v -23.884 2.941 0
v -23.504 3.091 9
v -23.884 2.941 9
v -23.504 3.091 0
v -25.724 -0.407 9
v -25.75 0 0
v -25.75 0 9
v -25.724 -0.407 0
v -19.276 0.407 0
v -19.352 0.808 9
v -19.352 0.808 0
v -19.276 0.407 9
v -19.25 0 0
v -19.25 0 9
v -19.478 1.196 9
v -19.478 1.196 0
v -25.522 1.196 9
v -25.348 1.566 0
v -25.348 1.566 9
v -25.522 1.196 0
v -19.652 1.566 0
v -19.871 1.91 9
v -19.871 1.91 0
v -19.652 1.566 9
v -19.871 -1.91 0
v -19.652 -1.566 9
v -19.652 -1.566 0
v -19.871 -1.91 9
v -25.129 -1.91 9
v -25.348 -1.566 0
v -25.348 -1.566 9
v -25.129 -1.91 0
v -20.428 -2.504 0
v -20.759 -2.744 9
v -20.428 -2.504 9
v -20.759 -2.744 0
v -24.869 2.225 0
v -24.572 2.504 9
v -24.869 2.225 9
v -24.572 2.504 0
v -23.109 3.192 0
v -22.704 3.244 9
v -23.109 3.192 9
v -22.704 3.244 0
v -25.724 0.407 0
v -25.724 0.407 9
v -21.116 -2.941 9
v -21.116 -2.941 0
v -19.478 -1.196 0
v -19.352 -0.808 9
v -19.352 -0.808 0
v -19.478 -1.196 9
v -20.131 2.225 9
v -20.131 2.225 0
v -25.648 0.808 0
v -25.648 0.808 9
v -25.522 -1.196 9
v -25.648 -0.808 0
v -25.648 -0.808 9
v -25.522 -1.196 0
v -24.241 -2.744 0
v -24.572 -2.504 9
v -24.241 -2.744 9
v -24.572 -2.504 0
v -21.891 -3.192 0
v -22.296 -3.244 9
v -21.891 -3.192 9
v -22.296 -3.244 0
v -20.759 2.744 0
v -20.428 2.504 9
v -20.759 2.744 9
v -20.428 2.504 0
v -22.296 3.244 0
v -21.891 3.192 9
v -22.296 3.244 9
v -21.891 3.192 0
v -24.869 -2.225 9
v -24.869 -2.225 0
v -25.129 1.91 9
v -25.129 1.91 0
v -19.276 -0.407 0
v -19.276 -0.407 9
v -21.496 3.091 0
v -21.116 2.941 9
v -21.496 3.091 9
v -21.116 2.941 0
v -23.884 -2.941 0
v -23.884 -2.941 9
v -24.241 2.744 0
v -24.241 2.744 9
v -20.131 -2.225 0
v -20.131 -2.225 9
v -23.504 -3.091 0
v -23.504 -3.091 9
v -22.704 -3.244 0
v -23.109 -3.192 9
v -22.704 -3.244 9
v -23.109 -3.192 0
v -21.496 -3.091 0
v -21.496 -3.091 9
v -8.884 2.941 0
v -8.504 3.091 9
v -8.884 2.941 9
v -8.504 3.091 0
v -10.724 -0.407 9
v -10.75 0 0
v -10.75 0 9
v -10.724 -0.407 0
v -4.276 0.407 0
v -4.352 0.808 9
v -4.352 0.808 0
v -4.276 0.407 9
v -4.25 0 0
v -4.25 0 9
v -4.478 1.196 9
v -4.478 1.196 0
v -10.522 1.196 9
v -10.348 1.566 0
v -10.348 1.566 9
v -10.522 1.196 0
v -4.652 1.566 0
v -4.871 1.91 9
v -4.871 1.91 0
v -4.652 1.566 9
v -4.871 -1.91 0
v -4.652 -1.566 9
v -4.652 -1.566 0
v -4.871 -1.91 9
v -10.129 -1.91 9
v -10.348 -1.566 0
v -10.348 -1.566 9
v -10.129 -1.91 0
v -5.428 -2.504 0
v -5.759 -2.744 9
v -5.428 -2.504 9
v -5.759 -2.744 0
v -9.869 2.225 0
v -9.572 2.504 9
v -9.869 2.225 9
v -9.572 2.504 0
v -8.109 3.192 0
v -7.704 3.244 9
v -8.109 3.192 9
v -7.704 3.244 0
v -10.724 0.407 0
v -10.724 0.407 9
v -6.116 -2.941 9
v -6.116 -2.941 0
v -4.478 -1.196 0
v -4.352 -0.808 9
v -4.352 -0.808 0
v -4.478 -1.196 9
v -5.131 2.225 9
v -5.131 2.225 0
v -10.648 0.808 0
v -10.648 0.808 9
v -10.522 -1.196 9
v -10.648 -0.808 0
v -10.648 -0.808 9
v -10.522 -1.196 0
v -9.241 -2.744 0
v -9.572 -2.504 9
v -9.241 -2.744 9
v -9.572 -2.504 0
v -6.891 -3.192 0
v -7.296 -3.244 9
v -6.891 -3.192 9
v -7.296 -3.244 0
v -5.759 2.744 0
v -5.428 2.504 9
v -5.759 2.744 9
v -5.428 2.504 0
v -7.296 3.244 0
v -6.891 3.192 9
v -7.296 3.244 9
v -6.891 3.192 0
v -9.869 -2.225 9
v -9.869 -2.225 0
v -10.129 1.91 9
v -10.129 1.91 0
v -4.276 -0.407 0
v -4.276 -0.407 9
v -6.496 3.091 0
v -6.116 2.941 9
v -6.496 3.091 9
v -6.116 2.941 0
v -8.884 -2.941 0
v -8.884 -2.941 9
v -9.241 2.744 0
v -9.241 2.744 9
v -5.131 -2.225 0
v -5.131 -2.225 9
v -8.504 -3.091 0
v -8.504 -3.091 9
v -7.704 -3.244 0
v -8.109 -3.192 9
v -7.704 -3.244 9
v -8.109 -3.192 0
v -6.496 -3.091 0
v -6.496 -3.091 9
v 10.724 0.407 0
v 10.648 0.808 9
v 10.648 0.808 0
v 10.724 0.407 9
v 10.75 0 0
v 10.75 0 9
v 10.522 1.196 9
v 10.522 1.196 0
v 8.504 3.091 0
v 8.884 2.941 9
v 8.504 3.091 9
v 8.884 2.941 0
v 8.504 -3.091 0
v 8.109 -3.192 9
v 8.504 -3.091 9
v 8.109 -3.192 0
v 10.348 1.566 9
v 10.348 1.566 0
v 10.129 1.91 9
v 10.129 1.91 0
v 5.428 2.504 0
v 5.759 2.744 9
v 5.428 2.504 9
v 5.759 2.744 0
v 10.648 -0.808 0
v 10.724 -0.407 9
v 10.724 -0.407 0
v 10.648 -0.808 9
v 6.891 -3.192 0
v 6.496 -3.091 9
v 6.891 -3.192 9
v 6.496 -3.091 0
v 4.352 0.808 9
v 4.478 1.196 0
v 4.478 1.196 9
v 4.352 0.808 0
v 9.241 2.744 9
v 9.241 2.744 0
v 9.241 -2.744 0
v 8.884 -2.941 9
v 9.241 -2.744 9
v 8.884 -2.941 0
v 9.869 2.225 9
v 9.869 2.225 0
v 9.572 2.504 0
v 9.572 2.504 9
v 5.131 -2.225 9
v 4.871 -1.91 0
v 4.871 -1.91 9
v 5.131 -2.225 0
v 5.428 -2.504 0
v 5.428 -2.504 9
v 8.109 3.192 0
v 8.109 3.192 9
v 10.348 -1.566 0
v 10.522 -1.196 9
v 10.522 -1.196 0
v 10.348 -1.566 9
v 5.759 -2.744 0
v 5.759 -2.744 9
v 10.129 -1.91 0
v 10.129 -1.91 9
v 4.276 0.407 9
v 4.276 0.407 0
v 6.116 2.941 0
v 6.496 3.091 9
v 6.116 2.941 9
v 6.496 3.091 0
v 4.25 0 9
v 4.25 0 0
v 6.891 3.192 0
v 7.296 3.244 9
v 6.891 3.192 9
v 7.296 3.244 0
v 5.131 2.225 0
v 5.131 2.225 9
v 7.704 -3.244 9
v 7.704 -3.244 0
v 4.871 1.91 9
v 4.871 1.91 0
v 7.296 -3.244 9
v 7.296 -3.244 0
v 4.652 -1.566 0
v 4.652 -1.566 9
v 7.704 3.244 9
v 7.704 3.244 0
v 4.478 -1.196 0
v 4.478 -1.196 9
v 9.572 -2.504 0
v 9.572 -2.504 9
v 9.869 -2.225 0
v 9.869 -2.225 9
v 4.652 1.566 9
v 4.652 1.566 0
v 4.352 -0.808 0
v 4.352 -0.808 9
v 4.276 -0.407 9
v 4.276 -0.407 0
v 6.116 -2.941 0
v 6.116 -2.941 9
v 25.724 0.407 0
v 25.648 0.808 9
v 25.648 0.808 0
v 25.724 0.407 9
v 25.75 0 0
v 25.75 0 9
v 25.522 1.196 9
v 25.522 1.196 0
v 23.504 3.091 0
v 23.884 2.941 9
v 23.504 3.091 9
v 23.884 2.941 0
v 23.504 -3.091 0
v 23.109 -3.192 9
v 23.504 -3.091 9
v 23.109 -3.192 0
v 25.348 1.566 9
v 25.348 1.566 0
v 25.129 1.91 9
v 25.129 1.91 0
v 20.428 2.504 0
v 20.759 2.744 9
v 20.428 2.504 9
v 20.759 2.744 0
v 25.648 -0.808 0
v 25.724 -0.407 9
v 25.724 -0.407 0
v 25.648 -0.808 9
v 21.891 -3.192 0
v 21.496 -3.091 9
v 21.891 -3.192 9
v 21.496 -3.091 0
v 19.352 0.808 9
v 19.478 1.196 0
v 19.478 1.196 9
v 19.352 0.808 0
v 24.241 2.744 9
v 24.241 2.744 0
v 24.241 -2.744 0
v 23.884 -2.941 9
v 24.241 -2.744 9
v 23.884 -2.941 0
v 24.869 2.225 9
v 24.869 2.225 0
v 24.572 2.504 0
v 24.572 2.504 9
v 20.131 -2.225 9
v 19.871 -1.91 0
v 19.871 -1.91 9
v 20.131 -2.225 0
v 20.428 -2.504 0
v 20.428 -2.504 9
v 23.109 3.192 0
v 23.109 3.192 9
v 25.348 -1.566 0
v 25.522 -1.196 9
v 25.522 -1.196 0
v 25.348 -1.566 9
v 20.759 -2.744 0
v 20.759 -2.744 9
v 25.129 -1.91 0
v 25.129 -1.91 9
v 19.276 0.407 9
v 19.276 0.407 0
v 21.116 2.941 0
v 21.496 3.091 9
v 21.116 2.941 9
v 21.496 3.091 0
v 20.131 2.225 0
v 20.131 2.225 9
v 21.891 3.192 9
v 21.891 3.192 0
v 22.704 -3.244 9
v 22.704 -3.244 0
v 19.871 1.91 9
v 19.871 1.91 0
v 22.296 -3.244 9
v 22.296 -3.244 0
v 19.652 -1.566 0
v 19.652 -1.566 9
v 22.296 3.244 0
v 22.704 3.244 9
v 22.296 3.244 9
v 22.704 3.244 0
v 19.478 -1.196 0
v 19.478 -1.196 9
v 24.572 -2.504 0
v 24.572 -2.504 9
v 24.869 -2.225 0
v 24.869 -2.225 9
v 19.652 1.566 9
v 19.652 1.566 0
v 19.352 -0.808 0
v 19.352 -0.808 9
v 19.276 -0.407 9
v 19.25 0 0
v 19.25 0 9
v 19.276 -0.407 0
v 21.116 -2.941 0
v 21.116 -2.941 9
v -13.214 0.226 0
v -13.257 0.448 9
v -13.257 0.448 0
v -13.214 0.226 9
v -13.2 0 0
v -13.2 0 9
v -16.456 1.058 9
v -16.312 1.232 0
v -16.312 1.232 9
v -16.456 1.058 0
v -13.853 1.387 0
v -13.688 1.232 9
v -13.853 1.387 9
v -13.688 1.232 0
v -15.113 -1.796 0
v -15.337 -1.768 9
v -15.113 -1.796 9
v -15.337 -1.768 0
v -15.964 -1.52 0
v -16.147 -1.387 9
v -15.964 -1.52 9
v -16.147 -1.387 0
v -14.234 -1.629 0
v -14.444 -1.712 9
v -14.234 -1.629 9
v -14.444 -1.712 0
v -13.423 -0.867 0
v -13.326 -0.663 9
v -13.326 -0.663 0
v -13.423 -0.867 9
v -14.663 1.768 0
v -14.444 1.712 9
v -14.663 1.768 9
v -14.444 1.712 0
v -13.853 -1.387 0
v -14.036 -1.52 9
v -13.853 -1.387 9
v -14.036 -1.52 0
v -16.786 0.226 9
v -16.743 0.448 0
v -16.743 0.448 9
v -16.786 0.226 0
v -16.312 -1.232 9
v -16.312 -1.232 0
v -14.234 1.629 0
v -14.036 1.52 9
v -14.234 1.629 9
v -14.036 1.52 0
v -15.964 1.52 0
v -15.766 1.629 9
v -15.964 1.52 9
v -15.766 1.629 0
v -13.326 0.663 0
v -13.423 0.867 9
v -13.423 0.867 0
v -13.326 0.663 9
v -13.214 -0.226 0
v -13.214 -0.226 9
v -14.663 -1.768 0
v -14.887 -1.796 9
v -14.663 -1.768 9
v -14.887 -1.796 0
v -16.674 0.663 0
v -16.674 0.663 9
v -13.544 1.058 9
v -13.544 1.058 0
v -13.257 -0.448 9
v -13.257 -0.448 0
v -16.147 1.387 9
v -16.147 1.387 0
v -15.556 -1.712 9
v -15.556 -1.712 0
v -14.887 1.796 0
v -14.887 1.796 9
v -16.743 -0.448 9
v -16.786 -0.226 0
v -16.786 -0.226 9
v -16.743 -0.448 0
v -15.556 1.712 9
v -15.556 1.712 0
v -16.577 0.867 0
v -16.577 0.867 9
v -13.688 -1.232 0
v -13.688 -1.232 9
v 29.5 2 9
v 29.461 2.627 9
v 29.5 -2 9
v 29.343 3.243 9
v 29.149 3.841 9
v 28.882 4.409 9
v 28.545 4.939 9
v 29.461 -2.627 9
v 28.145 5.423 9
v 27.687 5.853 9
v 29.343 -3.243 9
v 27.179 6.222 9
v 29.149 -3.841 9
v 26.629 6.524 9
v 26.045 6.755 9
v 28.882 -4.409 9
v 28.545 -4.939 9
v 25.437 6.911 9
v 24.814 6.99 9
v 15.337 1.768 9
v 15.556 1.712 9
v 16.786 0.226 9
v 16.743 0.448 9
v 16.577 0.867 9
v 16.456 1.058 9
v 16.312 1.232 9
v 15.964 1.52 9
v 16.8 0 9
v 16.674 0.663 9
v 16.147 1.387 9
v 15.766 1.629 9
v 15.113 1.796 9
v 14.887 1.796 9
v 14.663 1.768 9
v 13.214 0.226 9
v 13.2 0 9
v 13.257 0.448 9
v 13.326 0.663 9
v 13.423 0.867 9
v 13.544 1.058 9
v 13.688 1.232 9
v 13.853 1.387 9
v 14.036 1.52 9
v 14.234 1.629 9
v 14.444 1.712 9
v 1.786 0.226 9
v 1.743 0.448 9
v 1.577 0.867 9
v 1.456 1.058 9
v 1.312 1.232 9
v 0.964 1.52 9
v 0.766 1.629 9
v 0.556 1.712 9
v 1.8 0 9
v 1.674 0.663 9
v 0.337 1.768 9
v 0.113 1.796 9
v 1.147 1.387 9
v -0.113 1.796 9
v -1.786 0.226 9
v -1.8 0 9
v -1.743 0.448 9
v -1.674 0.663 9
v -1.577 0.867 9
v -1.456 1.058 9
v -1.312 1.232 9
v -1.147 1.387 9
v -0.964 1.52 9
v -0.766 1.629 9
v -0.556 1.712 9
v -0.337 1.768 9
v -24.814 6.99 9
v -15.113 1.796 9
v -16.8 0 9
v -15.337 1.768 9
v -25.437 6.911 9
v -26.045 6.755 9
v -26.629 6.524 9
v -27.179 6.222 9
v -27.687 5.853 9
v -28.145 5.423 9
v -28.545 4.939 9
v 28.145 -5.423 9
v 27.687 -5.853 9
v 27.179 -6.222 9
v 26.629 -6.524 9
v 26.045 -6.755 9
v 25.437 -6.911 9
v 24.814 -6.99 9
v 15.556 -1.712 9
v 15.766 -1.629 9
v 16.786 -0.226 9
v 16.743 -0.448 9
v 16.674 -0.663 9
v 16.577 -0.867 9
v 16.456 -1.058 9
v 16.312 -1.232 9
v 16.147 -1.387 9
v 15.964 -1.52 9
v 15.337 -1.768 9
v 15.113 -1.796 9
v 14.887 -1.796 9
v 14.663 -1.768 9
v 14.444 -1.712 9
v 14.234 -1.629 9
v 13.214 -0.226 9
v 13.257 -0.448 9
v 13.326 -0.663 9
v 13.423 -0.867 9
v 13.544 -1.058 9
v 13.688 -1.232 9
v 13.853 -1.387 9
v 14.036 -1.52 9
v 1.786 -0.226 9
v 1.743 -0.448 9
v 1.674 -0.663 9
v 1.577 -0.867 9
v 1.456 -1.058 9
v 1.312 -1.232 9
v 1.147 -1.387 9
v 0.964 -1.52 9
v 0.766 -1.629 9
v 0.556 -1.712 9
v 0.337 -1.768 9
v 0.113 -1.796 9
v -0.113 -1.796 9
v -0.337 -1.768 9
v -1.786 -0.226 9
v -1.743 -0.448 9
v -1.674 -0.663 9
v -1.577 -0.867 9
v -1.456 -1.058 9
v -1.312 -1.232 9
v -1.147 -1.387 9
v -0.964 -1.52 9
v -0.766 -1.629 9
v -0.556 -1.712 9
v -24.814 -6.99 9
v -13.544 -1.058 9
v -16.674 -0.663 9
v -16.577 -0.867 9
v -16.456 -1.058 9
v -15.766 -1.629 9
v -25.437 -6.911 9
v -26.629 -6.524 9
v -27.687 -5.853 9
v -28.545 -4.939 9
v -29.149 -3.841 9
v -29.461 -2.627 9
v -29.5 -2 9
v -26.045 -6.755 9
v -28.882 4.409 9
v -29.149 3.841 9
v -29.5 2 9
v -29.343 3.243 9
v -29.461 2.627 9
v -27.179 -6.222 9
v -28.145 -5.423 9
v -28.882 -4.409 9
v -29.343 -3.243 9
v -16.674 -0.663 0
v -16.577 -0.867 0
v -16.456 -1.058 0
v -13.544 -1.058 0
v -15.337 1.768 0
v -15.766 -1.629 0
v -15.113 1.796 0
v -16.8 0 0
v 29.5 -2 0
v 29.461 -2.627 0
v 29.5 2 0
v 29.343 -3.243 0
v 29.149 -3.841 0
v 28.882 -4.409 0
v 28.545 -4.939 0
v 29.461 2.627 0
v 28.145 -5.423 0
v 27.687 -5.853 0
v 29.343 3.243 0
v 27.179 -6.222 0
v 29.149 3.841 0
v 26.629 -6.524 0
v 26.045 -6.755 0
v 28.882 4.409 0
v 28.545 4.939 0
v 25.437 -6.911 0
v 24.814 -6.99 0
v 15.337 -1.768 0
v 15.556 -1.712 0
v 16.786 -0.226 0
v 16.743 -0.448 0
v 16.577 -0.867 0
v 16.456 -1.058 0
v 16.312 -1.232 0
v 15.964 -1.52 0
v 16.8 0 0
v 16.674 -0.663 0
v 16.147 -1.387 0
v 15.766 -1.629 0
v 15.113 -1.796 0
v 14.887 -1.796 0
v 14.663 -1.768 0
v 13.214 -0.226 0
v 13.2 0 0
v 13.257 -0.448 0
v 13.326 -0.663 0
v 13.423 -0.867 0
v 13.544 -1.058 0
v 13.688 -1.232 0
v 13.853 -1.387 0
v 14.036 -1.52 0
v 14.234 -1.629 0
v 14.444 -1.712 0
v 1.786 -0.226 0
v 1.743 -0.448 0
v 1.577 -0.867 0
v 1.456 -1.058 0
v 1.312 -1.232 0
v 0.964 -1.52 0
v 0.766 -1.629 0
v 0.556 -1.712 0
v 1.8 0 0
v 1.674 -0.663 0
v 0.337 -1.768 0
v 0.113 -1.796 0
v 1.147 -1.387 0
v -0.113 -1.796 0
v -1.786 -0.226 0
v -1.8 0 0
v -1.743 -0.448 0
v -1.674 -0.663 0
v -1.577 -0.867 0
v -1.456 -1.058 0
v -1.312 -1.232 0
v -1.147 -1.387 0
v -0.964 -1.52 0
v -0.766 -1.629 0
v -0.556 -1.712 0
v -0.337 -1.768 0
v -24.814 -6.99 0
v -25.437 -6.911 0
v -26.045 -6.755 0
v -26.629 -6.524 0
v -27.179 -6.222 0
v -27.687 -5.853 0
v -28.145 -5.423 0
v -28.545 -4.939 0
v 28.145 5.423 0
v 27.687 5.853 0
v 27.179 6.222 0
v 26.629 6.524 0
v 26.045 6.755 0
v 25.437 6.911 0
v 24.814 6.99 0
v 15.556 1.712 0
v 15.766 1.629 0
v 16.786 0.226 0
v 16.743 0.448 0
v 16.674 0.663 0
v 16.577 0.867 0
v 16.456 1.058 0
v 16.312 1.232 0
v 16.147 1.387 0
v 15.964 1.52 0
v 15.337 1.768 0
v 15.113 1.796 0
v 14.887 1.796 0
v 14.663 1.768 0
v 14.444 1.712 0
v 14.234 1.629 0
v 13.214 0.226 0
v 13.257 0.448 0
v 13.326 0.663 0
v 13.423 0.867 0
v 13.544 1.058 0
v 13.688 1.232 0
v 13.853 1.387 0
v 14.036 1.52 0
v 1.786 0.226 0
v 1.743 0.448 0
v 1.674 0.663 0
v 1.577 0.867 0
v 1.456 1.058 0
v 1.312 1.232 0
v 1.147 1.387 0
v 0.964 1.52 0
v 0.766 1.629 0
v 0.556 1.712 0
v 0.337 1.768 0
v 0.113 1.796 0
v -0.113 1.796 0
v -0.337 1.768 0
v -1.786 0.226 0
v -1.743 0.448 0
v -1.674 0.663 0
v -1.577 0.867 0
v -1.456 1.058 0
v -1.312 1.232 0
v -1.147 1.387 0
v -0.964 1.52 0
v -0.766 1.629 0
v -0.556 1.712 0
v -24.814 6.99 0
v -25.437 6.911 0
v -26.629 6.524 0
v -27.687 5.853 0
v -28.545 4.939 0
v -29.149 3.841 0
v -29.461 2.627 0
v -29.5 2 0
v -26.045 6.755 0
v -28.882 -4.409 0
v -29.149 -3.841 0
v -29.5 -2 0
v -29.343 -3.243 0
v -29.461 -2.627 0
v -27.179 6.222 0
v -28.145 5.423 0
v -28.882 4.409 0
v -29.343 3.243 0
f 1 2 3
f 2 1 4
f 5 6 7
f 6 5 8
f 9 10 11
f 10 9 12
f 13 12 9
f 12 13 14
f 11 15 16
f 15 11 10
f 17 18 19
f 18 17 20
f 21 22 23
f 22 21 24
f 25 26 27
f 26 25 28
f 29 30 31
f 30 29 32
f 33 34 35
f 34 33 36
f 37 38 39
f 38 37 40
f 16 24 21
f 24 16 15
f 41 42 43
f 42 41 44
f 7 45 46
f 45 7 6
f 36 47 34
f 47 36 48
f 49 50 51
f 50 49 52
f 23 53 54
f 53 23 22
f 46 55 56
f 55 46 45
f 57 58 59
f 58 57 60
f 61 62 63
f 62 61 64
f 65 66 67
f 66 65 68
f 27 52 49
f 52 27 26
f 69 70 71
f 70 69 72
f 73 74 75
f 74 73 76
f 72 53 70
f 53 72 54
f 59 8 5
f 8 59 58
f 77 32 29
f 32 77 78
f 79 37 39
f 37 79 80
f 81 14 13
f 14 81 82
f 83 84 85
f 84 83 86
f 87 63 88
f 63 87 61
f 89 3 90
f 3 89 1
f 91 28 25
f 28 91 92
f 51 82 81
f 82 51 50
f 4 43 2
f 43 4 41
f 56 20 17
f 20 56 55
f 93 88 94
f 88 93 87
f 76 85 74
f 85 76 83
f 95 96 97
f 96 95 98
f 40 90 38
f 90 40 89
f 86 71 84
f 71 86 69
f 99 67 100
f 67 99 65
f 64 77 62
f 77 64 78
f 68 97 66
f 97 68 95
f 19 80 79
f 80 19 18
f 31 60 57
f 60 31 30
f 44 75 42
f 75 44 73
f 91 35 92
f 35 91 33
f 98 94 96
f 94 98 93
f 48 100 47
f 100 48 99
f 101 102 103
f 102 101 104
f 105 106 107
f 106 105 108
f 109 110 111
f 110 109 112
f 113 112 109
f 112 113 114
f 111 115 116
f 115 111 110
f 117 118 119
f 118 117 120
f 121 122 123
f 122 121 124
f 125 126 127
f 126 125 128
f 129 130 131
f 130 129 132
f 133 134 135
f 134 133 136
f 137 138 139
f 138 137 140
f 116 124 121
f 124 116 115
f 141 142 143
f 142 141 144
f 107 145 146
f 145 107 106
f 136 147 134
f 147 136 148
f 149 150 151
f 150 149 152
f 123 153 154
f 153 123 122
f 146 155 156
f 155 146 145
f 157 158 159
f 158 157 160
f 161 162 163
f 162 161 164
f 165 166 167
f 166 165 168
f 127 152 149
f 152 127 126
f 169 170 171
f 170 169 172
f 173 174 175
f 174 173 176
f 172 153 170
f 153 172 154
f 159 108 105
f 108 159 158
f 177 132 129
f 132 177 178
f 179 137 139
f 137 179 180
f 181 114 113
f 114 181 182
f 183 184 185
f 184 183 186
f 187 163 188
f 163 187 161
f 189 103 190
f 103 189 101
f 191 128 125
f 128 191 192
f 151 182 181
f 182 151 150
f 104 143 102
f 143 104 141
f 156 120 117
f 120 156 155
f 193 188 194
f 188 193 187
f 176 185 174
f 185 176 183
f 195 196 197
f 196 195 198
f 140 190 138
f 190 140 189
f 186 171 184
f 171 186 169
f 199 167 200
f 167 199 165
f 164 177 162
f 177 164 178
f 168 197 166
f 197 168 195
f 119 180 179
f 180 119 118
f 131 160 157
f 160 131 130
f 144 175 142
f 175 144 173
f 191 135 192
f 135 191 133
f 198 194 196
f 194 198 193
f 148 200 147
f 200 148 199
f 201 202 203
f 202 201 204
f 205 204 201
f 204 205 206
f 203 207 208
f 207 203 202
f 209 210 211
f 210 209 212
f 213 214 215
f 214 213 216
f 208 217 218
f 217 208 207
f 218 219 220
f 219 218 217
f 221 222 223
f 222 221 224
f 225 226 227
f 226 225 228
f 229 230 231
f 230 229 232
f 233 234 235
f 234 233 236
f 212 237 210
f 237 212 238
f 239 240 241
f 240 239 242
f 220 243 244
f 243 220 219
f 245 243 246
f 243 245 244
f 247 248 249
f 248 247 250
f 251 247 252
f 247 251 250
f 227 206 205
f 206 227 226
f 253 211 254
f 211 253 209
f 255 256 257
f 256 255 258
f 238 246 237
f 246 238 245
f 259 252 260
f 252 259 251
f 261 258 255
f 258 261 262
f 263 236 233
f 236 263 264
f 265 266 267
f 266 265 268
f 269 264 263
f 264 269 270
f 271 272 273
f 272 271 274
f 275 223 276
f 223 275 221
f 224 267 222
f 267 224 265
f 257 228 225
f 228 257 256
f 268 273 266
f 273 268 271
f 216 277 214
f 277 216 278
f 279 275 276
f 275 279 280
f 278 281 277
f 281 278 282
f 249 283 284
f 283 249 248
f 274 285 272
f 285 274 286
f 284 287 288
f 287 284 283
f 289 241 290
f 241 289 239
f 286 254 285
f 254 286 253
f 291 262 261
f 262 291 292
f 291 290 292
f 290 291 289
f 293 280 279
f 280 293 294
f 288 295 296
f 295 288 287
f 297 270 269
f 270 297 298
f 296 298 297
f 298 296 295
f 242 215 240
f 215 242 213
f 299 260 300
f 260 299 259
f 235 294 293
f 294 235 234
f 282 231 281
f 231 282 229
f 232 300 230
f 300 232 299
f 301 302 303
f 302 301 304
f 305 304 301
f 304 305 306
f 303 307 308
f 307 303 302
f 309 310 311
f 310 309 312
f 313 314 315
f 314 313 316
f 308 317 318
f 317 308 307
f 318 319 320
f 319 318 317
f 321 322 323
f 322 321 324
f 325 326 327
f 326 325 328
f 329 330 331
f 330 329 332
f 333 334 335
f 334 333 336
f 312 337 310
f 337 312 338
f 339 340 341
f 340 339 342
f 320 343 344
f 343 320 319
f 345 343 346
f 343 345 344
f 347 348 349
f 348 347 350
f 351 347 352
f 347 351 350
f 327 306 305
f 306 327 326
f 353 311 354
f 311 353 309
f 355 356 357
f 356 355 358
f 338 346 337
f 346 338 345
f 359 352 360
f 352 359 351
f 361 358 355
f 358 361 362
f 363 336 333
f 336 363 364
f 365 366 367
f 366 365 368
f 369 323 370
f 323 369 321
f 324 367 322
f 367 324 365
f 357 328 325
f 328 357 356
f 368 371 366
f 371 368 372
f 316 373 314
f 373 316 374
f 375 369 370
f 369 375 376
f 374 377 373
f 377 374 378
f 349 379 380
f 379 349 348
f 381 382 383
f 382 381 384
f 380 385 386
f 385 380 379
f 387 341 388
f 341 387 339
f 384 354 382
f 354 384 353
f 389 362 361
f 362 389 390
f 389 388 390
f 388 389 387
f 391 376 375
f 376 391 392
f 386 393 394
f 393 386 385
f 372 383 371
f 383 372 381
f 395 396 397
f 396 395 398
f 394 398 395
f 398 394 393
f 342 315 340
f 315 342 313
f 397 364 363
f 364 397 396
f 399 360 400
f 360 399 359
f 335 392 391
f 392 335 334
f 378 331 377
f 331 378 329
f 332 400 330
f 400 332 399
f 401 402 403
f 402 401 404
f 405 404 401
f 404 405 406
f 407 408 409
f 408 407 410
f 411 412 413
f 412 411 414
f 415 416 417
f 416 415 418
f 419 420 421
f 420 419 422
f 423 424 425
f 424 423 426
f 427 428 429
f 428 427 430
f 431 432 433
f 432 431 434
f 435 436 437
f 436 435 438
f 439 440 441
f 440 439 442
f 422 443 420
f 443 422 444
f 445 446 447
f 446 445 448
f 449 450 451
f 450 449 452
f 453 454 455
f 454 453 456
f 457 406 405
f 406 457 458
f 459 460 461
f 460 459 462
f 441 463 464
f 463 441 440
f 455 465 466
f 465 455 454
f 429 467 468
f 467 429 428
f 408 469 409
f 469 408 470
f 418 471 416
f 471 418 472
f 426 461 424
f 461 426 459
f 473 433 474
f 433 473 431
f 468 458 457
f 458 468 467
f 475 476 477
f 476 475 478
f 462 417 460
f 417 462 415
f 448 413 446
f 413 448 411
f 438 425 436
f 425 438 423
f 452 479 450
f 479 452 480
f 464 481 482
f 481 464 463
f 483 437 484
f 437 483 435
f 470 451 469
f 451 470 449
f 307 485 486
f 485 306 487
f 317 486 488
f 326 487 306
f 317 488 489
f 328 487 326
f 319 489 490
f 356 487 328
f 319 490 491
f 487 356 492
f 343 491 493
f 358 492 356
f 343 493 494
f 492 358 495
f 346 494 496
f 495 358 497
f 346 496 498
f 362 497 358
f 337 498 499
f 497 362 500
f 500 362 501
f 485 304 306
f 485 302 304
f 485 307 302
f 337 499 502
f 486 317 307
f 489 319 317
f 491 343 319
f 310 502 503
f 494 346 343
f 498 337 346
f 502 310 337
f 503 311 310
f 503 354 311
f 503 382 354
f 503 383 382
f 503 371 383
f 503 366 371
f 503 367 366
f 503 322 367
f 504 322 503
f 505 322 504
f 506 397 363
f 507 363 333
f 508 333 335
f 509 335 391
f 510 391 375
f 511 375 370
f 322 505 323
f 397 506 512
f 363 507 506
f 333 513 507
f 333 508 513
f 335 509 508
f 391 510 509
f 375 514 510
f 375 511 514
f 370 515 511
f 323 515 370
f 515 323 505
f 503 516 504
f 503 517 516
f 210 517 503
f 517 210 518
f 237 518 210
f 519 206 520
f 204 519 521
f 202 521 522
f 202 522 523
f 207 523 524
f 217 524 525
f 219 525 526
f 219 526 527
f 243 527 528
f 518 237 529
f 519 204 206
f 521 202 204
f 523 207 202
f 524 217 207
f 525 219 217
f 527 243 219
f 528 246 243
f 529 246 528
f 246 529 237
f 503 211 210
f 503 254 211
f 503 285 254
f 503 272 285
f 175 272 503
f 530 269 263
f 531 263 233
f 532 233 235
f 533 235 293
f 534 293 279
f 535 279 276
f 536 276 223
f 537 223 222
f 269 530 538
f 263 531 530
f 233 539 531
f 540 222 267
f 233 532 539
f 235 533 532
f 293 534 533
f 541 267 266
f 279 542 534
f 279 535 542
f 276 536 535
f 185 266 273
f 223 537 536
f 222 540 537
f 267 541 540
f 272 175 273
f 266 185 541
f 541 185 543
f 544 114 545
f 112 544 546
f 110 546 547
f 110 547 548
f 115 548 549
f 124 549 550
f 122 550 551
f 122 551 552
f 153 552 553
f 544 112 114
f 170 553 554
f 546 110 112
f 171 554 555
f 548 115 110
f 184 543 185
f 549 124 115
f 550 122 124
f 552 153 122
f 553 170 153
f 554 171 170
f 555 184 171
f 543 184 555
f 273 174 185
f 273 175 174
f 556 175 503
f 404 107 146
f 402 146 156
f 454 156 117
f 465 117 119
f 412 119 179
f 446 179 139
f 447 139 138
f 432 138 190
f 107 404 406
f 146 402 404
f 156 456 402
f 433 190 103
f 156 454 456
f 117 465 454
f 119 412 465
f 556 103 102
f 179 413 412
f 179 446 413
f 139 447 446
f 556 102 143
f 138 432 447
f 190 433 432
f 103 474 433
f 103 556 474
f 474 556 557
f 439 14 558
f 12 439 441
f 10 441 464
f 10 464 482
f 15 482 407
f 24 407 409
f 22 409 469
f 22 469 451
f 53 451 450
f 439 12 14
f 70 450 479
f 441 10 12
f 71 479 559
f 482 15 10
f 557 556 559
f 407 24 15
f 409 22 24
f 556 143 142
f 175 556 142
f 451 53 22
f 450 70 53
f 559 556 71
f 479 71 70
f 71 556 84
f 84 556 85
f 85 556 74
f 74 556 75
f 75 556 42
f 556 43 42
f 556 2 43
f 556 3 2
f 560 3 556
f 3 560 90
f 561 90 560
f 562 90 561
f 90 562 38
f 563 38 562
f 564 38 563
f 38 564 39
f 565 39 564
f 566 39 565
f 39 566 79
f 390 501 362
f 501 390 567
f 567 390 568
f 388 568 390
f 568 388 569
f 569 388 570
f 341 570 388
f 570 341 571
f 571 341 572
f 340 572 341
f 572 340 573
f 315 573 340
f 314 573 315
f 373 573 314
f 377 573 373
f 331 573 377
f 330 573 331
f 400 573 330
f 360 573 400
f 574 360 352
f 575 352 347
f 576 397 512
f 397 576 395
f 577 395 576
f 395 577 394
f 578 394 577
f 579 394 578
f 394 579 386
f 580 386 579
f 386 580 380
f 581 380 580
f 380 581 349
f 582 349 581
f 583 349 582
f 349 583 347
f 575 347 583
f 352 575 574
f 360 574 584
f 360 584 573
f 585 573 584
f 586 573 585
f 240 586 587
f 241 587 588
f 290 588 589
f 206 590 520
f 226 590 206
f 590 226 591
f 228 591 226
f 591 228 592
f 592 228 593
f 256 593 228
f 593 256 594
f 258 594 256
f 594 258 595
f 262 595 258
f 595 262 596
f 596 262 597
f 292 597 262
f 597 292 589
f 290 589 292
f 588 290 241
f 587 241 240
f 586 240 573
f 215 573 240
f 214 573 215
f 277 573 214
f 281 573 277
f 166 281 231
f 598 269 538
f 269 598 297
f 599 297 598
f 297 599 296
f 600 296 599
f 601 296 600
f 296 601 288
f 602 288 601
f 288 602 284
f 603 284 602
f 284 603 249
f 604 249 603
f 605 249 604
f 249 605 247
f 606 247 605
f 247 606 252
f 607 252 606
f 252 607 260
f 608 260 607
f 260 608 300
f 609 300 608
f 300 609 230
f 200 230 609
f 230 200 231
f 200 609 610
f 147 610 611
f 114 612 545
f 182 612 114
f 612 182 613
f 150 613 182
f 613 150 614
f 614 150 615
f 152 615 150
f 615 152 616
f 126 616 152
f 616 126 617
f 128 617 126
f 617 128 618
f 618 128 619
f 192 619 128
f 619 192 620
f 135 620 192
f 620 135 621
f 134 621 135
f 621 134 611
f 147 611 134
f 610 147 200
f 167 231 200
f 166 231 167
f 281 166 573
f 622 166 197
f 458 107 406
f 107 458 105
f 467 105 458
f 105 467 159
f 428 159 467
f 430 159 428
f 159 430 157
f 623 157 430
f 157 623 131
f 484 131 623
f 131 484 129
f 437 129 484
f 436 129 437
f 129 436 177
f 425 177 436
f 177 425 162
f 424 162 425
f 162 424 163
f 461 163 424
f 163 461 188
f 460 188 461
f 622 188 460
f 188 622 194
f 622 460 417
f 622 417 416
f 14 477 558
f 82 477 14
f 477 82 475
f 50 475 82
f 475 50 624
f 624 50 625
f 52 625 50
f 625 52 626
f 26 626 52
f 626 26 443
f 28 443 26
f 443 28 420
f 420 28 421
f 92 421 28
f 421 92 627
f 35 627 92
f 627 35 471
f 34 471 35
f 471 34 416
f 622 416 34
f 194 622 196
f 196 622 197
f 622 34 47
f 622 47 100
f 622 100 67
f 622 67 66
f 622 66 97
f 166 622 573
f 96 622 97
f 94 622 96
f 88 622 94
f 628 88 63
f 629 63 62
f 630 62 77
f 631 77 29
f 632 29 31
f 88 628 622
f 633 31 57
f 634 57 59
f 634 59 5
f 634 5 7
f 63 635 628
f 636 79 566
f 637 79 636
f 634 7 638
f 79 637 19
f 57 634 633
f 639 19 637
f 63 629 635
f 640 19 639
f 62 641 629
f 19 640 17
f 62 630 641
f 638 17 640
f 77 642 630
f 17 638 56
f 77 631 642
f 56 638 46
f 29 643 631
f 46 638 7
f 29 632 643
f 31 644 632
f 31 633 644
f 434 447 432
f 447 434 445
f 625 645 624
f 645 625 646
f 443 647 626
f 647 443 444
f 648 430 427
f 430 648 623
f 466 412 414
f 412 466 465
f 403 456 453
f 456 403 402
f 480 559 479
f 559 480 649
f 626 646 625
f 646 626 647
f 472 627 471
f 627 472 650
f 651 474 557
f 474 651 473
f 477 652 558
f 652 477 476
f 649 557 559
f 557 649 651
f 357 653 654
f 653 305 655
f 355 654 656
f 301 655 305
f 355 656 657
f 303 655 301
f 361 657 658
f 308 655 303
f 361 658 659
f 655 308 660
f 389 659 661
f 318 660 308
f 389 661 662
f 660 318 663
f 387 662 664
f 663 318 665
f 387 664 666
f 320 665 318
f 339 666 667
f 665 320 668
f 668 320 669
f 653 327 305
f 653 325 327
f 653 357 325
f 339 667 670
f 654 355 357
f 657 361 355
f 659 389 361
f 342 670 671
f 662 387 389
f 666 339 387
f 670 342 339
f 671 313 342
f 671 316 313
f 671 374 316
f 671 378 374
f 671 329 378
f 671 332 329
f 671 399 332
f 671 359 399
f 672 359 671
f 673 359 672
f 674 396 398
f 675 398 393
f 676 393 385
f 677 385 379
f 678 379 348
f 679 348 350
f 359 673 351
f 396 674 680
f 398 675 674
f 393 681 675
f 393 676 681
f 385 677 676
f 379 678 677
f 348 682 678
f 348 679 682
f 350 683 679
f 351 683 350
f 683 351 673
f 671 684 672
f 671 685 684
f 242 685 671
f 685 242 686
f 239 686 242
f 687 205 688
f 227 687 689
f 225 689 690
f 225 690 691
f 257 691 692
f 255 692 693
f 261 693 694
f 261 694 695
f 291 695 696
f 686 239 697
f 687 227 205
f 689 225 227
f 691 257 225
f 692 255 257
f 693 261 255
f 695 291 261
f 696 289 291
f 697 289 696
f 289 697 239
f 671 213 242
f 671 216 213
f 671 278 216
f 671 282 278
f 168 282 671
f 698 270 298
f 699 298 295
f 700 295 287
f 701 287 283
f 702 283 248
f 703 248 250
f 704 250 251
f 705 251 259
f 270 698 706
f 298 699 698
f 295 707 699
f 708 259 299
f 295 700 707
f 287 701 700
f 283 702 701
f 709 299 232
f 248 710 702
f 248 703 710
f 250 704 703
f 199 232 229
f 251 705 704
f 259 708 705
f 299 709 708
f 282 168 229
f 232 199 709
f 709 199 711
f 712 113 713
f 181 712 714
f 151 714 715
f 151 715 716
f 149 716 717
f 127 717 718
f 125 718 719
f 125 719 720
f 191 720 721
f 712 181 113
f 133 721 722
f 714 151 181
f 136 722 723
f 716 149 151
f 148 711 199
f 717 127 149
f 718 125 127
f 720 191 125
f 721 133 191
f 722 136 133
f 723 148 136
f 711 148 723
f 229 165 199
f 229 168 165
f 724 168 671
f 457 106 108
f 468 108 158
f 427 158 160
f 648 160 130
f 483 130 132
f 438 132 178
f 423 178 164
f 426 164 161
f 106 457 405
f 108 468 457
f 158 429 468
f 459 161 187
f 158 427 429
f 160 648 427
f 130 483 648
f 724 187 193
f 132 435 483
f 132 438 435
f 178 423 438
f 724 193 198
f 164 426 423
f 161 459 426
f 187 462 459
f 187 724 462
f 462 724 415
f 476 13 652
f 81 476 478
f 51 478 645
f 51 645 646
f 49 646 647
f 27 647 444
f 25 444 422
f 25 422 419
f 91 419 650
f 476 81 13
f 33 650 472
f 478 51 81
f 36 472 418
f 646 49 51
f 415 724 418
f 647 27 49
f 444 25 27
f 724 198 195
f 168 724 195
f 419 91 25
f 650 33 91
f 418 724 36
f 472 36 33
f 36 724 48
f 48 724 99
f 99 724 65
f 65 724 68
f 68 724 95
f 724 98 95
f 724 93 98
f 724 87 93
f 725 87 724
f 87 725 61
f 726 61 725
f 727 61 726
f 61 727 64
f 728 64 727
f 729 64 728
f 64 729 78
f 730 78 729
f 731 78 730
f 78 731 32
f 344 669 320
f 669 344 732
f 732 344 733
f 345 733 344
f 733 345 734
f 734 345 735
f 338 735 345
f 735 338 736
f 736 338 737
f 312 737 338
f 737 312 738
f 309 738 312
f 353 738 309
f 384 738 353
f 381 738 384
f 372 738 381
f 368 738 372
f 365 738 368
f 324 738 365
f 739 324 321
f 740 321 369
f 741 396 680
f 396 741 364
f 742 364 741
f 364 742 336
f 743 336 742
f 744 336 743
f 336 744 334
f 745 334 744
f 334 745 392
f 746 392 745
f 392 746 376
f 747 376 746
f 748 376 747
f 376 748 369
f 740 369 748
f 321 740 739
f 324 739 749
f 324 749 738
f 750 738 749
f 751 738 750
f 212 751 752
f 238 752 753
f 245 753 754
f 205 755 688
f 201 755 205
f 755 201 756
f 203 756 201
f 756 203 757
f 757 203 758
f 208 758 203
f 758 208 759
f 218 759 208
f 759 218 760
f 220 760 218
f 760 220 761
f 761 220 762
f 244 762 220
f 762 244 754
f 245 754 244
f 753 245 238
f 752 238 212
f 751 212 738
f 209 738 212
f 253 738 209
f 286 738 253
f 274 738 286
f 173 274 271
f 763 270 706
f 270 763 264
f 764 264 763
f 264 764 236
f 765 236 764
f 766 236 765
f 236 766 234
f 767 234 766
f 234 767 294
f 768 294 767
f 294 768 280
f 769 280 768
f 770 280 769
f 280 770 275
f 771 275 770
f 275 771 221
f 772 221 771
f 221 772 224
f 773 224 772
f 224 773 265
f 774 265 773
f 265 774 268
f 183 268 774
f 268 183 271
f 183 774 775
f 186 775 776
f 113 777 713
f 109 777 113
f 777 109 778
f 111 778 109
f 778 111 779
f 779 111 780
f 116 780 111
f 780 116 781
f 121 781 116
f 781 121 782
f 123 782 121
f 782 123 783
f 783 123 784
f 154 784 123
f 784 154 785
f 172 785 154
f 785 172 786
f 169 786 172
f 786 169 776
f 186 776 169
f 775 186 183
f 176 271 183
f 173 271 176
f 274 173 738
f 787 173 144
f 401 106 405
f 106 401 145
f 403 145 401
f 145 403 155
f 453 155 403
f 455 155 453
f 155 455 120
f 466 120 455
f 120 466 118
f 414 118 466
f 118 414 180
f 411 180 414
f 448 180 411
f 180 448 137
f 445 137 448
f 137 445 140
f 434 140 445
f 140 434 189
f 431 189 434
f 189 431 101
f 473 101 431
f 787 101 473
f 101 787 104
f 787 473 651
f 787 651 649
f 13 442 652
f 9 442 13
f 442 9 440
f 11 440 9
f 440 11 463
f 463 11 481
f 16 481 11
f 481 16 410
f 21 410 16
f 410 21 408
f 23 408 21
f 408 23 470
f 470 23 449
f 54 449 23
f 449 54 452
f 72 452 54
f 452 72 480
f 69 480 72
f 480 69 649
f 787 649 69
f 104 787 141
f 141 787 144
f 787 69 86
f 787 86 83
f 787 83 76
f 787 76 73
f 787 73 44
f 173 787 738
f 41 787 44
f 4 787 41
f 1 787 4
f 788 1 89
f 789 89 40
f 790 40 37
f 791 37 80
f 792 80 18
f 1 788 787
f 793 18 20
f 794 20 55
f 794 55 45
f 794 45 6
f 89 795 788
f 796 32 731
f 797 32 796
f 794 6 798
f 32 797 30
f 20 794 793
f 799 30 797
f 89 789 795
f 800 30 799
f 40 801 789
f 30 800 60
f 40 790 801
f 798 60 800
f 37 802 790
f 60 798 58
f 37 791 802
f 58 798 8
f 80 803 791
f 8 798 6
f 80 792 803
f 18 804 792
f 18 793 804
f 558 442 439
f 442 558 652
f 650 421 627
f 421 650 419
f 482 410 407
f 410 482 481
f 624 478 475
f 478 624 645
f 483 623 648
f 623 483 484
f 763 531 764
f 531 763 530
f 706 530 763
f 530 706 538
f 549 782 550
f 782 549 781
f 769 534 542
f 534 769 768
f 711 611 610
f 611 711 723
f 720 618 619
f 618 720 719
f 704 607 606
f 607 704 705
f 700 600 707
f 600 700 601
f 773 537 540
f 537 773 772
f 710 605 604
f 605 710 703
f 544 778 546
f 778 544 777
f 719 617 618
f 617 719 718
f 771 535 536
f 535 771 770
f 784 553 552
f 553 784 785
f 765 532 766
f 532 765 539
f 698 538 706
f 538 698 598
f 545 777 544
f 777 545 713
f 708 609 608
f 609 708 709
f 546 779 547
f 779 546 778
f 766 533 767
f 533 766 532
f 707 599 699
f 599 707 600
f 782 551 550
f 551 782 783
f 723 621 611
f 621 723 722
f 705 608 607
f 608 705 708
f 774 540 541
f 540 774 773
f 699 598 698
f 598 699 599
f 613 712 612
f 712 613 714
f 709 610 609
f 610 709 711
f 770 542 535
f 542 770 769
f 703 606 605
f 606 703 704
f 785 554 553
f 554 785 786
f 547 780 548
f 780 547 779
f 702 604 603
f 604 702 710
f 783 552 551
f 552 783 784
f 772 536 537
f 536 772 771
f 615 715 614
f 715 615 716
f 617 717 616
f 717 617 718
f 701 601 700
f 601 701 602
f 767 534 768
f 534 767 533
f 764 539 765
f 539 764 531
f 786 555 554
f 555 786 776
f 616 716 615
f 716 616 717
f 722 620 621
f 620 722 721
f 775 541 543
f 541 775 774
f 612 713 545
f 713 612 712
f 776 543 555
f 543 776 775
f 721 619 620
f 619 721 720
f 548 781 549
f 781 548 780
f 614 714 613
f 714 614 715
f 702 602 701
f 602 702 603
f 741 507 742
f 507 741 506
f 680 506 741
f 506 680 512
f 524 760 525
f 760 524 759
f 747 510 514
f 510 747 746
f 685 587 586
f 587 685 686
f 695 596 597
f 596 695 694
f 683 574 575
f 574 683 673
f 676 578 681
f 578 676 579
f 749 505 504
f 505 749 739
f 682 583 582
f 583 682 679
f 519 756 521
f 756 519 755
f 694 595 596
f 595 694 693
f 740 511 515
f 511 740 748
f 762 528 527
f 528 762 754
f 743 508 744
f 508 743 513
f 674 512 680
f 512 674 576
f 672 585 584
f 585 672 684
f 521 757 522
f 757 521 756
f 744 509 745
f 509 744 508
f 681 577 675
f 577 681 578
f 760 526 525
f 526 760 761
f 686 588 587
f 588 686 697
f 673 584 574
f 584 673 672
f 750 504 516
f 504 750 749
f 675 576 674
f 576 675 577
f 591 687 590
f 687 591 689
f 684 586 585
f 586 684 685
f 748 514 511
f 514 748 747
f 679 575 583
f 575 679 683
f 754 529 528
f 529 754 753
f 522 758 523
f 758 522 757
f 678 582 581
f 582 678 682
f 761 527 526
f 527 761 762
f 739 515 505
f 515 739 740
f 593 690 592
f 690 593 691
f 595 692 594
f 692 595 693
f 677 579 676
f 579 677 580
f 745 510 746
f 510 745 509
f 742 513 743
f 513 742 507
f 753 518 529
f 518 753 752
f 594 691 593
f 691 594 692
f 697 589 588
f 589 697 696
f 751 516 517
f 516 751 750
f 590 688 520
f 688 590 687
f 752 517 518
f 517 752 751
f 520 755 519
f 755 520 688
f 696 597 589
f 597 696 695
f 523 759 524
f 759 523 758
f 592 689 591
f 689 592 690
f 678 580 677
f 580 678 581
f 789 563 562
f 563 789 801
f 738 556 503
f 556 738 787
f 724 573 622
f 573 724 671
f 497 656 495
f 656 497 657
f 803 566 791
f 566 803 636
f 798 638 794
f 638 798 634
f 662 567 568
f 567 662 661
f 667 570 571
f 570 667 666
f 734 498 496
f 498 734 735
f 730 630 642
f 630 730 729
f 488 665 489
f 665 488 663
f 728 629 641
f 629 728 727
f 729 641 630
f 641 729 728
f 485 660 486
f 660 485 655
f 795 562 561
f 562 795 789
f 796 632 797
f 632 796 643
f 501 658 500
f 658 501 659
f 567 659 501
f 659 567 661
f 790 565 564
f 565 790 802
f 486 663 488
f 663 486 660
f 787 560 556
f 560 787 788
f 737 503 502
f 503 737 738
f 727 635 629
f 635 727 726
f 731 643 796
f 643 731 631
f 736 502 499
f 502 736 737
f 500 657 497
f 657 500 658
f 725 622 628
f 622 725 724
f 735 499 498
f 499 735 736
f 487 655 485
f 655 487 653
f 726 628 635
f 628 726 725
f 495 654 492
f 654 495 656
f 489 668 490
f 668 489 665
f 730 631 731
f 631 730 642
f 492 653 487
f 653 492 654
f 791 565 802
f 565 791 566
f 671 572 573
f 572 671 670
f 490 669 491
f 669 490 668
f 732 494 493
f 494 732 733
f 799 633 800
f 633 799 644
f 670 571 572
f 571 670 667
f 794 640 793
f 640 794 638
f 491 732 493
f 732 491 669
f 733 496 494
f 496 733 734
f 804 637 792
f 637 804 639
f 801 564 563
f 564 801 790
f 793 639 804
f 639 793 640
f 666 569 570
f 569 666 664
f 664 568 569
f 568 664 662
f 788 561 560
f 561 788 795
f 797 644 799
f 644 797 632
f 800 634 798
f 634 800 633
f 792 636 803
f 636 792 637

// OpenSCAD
$fn = 50;


difference() {
	union() {
		hull() {
			translate(v = [-24.5000000000, 2.0000000000, 0]) {
				cylinder(h = 9, r = 5);
			}
			translate(v = [24.5000000000, 2.0000000000, 0]) {
				cylinder(h = 9, r = 5);
			}
			translate(v = [-24.5000000000, -2.0000000000, 0]) {
				cylinder(h = 9, r = 5);
			}
			translate(v = [24.5000000000, -2.0000000000, 0]) {
				cylinder(h = 9, r = 5);
			}
		}
	}
	union() {
		translate(v = [-22.5000000000, 0.0000000000, -100.0000000000]) {
			cylinder(h = 200, r = 3.2500000000);
		}
		translate(v = [-7.5000000000, 0.0000000000, -100.0000000000]) {
			cylinder(h = 200, r = 3.2500000000);
		}
		translate(v = [7.5000000000, 0.0000000000, -100.0000000000]) {
			cylinder(h = 200, r = 3.2500000000);
		}
		translate(v = [22.5000000000, 0.0000000000, -100.0000000000]) {
			cylinder(h = 200, r = 3.2500000000);
		}
		translate(v = [-22.5000000000, 0.0000000000, 0]) {
			cylinder(h = 9, r = 1.8000000000);
		}
		translate(v = [-15.0000000000, 0.0000000000, 0]) {
			cylinder(h = 9, r = 1.8000000000);
		}
		translate(v = [-7.5000000000, 0.0000000000, 0]) {
			cylinder(h = 9, r = 1.8000000000);
		}
		cylinder(h = 9, r = 1.8000000000);
		translate(v = [7.5000000000, 0.0000000000, 0]) {
			cylinder(h = 9, r = 1.8000000000);
		}
		translate(v = [15.0000000000, 0.0000000000, 0]) {
			cylinder(h = 9, r = 1.8000000000);
		}
		translate(v = [22.5000000000, 0.0000000000, 0]) {
			cylinder(h = 9, r = 1.8000000000);
		}
		translate(v = [-22.5000000000, 0.0000000000, 0]) {
			cylinder(h = 9, r = 1.8000000000);
		}
		translate(v = [-15.0000000000, 0.0000000000, 0]) {
			cylinder(h = 9, r = 1.8000000000);
		}
		translate(v = [-7.5000000000, 0.0000000000, 0]) {
			cylinder(h = 9, r = 1.8000000000);
		}
		cylinder(h = 9, r = 1.8000000000);
		translate(v = [7.5000000000, 0.0000000000, 0]) {
			cylinder(h = 9, r = 1.8000000000);
		}
		translate(v = [15.0000000000, 0.0000000000, 0]) {
			cylinder(h = 9, r = 1.8000000000);
		}
		translate(v = [22.5000000000, 0.0000000000, 0]) {
			cylinder(h = 9, r = 1.8000000000);
		}
		translate(v = [-22.5000000000, 0.0000000000, 0]) {
			cylinder(h = 9, r = 1.8000000000);
		}
		translate(v = [-15.0000000000, 0.0000000000, 0]) {
			cylinder(h = 9, r = 1.8000000000);
		}
		translate(v = [-7.5000000000, 0.0000000000, 0]) {
			cylinder(h = 9, r = 1.8000000000);
		}
		cylinder(h = 9, r = 1.8000000000);
		translate(v = [7.5000000000, 0.0000000000, 0]) {
			cylinder(h = 9, r = 1.8000000000);
		}
		translate(v = [15.0000000000, 0.0000000000, 0]) {
			cylinder(h = 9, r = 1.8000000000);
		}
		translate(v = [22.5000000000, 0.0000000000, 0]) {
			cylinder(h = 9, r = 1.8000000000);
		}
	}
}
